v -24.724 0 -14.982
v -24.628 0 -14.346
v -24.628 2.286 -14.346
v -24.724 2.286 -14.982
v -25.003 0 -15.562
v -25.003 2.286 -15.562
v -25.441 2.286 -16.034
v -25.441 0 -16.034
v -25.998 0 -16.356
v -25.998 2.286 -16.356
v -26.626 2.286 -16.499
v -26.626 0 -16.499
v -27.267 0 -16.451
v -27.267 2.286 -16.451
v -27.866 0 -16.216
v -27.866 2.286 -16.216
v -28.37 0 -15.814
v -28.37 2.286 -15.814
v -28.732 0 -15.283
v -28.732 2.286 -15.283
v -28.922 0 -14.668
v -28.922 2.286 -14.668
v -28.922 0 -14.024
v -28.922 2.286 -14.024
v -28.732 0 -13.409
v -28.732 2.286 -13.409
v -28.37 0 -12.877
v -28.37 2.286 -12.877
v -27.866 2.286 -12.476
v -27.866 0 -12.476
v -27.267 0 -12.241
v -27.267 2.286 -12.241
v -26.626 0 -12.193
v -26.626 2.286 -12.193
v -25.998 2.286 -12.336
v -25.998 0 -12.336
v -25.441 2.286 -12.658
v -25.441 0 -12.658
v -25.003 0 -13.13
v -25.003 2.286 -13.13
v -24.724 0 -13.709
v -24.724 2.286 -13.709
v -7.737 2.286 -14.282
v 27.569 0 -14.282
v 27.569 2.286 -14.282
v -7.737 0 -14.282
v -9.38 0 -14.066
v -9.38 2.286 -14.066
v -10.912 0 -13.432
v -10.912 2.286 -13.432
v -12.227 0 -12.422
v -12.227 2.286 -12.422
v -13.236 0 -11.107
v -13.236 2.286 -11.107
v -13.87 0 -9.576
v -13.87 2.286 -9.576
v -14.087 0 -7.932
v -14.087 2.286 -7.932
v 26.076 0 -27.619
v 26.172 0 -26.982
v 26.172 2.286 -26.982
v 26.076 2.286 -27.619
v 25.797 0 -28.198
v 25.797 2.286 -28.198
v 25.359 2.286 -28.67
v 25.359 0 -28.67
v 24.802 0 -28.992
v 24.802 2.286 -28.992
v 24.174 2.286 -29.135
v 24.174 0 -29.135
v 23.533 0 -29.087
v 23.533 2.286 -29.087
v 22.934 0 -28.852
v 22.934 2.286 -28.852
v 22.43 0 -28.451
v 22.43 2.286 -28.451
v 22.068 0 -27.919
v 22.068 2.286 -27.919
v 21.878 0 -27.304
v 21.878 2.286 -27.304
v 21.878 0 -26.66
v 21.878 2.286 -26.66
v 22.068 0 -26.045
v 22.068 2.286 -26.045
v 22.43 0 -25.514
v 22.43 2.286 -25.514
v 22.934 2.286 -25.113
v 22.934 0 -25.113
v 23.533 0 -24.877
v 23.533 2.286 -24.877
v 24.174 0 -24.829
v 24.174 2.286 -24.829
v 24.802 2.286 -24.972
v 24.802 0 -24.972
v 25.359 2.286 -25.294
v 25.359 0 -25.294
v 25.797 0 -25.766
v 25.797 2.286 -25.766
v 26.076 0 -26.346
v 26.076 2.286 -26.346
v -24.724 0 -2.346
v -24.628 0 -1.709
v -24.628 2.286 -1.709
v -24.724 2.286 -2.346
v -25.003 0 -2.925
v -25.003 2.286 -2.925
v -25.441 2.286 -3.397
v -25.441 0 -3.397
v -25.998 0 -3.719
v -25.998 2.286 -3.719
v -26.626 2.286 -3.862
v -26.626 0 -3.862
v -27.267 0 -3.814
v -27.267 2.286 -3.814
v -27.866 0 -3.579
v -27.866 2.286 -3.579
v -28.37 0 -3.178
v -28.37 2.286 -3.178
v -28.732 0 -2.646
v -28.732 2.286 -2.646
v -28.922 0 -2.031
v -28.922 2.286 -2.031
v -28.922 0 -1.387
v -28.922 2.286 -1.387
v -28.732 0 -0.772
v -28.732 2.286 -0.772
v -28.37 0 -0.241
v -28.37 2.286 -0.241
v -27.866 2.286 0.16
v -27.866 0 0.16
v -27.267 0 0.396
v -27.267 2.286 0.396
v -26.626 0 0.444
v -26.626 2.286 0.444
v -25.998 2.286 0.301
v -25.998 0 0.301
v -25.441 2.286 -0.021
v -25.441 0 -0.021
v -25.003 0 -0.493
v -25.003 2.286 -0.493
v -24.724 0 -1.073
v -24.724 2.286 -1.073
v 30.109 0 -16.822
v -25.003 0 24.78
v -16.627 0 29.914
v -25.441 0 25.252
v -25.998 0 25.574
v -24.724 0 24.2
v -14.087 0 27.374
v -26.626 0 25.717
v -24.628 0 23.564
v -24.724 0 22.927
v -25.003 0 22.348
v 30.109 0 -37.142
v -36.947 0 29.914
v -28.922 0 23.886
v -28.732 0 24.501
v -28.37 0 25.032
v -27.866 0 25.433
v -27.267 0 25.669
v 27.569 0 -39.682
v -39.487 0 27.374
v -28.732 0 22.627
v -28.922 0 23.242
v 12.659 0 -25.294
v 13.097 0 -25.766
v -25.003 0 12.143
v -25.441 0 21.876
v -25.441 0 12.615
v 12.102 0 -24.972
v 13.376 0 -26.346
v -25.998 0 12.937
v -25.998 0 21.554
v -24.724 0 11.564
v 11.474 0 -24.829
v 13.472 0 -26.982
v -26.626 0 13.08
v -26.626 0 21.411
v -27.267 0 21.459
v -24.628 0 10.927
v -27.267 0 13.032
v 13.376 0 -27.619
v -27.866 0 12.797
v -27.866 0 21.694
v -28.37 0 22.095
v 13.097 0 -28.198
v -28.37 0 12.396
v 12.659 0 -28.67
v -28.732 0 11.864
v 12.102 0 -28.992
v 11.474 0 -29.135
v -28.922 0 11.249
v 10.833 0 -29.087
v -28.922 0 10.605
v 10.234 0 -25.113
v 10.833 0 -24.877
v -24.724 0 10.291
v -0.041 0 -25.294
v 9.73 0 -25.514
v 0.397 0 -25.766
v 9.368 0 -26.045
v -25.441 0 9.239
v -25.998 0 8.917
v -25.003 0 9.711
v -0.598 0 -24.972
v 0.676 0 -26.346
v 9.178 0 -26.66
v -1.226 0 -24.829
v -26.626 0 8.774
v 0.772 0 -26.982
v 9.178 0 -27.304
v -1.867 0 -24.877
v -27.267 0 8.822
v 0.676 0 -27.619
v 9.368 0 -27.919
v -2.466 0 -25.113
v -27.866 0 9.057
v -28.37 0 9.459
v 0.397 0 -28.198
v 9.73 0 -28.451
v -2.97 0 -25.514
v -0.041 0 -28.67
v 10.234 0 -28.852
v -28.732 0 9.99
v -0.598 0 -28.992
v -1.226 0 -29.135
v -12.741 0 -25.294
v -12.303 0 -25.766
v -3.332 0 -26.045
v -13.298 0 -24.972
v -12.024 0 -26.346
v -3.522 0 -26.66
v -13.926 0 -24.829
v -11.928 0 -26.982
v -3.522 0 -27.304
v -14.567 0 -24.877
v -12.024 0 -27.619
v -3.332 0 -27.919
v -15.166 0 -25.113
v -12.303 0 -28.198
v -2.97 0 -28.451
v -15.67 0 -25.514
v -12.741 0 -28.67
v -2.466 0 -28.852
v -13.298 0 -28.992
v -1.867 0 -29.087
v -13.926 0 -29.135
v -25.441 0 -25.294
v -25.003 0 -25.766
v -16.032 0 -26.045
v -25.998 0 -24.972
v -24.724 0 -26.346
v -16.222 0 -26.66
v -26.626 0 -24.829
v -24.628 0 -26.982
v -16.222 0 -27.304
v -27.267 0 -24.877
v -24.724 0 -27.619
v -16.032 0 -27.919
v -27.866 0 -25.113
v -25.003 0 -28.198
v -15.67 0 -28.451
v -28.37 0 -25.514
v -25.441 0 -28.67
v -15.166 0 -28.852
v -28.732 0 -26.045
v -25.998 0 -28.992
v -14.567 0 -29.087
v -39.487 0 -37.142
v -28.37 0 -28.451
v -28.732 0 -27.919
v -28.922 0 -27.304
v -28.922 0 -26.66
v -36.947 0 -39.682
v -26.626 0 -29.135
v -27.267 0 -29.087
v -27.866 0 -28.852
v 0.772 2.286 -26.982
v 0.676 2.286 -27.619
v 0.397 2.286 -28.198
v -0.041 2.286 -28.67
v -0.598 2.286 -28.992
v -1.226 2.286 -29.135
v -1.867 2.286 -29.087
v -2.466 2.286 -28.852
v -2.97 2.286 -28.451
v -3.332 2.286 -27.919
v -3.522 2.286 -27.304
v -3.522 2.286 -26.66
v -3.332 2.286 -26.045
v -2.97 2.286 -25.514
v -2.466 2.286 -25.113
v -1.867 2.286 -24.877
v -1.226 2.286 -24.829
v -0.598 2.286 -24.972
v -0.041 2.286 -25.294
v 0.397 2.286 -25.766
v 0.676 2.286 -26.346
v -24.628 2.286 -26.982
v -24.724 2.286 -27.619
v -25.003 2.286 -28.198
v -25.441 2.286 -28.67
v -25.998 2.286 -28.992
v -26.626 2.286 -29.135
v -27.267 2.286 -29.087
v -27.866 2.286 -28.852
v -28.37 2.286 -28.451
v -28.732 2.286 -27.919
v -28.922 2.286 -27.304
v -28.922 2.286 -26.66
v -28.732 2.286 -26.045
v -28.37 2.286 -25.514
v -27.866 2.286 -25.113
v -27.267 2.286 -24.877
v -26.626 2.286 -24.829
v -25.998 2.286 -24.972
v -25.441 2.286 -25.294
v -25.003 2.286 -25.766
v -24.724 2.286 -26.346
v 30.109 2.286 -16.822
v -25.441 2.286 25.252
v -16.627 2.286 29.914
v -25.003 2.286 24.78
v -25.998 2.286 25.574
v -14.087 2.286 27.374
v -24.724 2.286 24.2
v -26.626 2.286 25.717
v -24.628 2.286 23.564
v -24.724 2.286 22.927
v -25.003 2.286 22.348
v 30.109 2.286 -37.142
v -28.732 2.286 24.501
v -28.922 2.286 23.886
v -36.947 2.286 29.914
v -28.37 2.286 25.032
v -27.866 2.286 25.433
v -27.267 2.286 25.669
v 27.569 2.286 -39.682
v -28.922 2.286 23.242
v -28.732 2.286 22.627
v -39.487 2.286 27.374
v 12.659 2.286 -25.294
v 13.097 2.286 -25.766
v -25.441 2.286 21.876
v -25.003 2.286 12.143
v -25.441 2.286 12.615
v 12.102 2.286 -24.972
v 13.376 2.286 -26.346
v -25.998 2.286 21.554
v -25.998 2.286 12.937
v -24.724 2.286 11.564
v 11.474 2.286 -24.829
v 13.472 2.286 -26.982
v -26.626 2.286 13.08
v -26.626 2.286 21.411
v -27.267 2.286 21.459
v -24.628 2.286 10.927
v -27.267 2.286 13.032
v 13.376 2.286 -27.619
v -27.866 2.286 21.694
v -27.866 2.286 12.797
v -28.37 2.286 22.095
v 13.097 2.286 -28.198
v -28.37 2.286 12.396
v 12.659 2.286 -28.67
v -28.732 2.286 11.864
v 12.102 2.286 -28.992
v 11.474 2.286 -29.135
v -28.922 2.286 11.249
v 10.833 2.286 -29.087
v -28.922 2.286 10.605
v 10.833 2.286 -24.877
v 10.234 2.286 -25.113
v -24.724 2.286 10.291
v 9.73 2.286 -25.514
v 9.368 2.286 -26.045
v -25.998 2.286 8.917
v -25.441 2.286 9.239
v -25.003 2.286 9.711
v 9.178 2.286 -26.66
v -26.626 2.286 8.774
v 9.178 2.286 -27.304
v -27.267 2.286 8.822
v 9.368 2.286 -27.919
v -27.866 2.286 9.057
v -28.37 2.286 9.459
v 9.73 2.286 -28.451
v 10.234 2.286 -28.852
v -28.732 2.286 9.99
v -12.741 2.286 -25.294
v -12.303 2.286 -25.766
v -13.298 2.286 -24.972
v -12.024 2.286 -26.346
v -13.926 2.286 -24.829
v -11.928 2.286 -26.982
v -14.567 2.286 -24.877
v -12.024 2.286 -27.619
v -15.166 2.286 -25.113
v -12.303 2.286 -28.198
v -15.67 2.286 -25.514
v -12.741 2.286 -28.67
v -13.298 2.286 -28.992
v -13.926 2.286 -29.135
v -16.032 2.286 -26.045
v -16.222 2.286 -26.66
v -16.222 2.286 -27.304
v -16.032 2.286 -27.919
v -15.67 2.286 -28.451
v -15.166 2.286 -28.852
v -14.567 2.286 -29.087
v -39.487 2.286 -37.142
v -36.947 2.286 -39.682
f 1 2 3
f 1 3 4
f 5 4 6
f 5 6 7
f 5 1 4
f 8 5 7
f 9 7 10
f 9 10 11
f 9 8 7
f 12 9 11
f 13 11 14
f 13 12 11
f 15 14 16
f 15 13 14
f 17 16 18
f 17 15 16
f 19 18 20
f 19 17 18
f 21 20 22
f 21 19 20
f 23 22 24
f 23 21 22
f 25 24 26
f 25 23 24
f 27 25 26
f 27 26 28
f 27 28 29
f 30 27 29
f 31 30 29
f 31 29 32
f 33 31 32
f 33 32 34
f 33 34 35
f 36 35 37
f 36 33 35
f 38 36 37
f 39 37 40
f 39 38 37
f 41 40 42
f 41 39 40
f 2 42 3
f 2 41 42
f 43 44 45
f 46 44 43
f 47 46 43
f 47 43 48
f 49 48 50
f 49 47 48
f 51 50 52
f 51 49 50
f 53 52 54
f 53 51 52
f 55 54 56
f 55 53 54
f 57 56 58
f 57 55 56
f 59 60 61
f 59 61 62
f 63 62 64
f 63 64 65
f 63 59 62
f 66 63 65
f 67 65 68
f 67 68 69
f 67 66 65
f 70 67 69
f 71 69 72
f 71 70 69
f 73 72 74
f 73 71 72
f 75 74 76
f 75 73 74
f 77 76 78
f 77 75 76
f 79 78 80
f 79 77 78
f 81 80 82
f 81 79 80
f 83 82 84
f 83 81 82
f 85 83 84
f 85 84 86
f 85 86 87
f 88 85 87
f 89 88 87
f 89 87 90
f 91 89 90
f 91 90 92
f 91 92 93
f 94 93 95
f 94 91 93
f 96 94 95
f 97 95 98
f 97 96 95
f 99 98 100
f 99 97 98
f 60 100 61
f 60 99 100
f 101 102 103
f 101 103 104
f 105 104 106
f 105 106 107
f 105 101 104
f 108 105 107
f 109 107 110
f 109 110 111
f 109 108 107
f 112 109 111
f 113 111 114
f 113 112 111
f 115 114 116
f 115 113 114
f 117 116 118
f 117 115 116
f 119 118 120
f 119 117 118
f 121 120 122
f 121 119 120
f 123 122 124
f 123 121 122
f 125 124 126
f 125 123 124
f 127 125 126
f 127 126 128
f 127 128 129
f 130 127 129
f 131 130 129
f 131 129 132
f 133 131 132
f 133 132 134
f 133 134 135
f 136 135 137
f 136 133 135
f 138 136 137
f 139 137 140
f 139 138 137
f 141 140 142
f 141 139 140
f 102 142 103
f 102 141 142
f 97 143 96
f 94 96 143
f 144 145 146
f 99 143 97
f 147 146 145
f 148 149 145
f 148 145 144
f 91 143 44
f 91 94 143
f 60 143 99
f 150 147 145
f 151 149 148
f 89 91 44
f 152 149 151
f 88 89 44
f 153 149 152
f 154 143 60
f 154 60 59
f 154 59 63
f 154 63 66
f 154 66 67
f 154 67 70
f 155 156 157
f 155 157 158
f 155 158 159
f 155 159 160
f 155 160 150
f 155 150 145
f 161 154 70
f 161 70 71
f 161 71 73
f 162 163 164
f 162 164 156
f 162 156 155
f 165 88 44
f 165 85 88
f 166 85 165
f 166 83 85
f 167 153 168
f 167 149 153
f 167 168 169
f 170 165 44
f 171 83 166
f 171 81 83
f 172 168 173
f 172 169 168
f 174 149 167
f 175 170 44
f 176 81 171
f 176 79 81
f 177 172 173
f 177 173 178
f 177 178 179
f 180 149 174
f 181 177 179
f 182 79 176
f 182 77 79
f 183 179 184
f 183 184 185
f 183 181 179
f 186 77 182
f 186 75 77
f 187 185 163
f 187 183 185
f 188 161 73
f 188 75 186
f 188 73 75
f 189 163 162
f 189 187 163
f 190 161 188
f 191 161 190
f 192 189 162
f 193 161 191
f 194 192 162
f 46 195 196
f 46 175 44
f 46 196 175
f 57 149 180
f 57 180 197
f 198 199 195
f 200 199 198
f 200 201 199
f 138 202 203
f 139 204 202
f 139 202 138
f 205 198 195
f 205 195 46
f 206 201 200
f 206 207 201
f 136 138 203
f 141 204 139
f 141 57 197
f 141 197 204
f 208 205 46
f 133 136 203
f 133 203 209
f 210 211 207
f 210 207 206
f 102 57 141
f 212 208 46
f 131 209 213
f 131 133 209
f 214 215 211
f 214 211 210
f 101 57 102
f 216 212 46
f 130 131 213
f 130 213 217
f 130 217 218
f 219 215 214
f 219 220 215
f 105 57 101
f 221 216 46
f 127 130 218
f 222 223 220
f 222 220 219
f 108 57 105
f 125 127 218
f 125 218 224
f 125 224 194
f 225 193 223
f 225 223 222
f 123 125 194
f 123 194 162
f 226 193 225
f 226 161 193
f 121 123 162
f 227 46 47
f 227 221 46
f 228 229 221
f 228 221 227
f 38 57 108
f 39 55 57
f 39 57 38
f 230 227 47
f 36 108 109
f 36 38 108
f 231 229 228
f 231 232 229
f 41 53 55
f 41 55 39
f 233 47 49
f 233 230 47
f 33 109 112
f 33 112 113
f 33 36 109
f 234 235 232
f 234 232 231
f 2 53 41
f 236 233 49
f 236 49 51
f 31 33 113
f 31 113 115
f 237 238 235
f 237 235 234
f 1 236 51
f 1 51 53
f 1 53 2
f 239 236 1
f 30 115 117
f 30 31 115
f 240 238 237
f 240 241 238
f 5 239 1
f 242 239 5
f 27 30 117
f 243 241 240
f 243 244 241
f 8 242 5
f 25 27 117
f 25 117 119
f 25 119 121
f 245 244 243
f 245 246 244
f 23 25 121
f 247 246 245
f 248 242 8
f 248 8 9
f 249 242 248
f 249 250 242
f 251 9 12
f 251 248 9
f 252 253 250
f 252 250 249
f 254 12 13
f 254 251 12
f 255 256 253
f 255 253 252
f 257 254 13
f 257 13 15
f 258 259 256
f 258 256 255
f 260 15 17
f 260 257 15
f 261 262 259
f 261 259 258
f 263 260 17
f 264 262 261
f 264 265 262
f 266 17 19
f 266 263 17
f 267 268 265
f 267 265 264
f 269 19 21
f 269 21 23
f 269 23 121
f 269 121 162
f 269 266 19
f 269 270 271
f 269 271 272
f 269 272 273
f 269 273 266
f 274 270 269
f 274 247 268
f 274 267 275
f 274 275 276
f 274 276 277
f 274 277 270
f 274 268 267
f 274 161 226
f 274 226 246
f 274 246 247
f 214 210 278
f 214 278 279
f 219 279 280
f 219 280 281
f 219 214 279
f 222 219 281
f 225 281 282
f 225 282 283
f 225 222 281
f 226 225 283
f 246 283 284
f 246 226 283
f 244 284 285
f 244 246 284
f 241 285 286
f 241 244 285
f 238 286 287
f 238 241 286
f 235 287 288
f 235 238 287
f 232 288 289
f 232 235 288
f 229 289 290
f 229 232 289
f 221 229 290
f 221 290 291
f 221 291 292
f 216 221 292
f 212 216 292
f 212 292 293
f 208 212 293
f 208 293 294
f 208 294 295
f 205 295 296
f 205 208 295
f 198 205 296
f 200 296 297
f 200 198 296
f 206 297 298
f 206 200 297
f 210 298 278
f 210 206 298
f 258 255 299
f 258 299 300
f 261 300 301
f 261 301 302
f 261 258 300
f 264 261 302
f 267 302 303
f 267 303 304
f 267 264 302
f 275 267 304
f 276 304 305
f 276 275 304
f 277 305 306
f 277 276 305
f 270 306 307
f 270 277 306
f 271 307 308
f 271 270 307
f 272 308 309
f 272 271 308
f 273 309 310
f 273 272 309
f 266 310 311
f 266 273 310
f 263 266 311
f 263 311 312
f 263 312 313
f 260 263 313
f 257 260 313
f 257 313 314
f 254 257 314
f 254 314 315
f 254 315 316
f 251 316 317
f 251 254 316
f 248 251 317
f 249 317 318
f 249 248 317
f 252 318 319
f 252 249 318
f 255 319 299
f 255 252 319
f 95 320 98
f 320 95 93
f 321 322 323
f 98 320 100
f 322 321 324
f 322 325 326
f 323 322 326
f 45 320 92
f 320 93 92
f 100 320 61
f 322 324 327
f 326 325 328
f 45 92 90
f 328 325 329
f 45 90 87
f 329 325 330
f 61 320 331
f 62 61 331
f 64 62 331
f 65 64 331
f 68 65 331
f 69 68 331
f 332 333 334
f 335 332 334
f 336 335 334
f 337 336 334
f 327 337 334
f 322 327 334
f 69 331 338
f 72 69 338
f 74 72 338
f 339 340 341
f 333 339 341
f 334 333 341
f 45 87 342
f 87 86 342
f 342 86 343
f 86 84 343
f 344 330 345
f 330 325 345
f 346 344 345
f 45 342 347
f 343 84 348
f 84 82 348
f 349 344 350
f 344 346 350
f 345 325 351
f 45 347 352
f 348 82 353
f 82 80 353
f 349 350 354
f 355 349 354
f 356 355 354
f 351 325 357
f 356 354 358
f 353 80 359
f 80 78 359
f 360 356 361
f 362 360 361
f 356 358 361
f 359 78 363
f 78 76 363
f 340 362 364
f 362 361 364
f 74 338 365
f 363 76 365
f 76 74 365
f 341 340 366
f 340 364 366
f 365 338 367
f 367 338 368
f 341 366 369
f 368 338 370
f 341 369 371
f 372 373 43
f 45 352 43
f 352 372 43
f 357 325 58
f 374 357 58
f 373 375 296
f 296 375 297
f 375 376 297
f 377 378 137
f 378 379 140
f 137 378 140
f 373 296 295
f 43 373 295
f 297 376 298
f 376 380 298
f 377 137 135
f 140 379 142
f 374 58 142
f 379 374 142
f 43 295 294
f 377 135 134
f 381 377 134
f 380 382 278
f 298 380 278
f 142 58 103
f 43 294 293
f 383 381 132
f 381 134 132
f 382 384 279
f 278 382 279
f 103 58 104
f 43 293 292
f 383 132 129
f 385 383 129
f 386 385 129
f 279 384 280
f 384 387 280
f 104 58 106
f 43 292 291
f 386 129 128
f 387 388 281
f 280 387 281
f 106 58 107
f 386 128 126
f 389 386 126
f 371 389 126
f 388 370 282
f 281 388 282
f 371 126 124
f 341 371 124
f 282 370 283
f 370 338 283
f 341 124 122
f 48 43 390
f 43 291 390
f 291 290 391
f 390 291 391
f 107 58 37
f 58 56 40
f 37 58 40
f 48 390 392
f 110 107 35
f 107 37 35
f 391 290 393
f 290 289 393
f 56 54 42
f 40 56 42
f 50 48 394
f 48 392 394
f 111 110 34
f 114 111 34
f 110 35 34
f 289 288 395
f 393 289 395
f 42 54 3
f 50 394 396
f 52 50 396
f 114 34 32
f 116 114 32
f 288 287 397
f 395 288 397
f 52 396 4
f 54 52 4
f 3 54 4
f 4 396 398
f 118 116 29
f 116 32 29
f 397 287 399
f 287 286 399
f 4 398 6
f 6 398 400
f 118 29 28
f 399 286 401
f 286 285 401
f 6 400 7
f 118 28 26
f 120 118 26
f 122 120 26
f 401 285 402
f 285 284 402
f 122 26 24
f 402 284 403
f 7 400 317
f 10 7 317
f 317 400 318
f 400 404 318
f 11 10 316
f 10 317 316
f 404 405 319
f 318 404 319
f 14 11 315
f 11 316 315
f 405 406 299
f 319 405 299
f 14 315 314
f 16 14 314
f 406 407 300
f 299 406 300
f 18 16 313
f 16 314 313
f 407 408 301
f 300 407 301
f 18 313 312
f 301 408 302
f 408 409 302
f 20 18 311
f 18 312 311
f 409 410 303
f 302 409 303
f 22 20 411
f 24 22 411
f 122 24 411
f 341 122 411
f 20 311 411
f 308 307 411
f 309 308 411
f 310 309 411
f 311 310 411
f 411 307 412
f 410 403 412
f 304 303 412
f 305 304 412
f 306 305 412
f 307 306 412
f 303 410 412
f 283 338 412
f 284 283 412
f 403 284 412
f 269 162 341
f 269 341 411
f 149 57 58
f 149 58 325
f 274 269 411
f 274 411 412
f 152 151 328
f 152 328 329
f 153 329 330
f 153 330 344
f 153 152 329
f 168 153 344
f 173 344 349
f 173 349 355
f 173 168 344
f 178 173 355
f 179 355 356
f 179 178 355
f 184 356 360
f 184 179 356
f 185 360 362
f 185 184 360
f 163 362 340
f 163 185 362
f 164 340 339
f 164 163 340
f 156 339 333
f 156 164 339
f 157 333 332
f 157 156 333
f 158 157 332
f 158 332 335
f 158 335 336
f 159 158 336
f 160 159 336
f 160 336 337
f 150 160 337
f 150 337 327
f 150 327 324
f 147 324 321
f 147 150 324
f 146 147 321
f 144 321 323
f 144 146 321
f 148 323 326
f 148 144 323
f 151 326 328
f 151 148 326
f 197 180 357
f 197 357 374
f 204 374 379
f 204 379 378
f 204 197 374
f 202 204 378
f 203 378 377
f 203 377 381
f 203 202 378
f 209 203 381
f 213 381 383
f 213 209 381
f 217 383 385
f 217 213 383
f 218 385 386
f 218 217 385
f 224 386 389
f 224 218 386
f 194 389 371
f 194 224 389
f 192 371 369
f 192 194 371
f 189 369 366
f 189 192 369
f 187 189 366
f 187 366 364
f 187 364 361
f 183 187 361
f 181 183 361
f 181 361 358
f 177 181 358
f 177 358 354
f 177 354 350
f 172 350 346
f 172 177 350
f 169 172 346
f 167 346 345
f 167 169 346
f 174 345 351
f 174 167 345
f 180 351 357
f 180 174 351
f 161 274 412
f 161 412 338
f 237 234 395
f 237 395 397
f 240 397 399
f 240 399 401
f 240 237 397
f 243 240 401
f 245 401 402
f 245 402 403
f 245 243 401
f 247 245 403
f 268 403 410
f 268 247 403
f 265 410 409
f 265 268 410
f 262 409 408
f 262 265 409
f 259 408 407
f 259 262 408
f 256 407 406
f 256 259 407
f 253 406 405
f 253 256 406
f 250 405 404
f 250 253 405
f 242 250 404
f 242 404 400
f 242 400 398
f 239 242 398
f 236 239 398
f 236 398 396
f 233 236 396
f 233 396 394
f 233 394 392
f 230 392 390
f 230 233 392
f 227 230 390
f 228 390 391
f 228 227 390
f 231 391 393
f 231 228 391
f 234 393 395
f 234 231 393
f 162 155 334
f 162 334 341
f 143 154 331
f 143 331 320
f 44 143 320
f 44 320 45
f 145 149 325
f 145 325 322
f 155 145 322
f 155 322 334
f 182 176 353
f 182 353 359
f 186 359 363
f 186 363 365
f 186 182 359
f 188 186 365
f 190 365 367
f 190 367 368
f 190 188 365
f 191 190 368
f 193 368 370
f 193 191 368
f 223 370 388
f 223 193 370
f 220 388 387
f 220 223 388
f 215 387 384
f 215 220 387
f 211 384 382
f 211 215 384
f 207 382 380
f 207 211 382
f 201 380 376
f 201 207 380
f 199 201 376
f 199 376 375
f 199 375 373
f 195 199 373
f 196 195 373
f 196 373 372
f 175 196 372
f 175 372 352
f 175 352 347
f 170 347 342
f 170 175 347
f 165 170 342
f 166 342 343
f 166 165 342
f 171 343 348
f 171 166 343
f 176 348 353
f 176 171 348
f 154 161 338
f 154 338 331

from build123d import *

# Parameters (mm, degrees)
SKETCH2_R           = 2.159
BOSS_EXTRUDE2_DEPTH = 2.286


with BuildPart() as part:
    # Sketch2 → Boss-Extrude2 (new body)
    with BuildSketch(Plane(origin=(0, 0, 0), x_dir=(1, 0, 0), z_dir=(0, 1, 0))):
        with BuildLine():
            Line((-39.486864346, -27.37374707), (-39.486864346, 37.14225293))
            Line((-39.486864346, 37.14225293), (-36.946864346, 39.68225293))
            Line((-36.946864346, 39.68225293), (27.569135654, 39.68225293))
            Line((27.569135654, 39.68225293), (30.109135654, 37.14225293))
            Line((30.109135654, 37.14225293), (30.109135654, 16.82225293))
            Line((30.109135654, 16.82225293), (27.569135654, 14.28225293))
            Line((27.569135654, 14.28225293), (-7.736864346, 14.28225293))
            ThreePointArc((-7.736864346, 14.28225293), (-12.226992406, 12.422380991), (-14.086864346, 7.93225293))
            Line((-14.086864346, 7.93225293), (-14.086864346, -27.37374707))
            Line((-14.086864346, -27.37374707), (-16.626864346, -29.91374707))
            Line((-16.626864346, -29.91374707), (-36.946864346, -29.91374707))
            Line((-36.946864346, -29.91374707), (-39.486864346, -27.37374707))
        make_face()
        with Locations((-26.786864346, 26.98225293)):
            Circle(SKETCH2_R, mode=Mode.SUBTRACT)
        with Locations((-14.086864346, 26.98225293)):
            Circle(SKETCH2_R, mode=Mode.SUBTRACT)
        with Locations((-1.386864346, 26.98225293)):
            Circle(SKETCH2_R, mode=Mode.SUBTRACT)
        with Locations((11.313135654, 26.98225293)):
            Circle(SKETCH2_R, mode=Mode.SUBTRACT)
        with Locations((24.013135654, 26.98225293)):
            Circle(SKETCH2_R, mode=Mode.SUBTRACT)
        with Locations((-26.786864346, 14.34575293)):
            Circle(SKETCH2_R, mode=Mode.SUBTRACT)
        with Locations((-26.786864346, 1.70925293)):
            Circle(SKETCH2_R, mode=Mode.SUBTRACT)
        with Locations((-26.786864346, -10.92724707)):
            Circle(SKETCH2_R, mode=Mode.SUBTRACT)
        with Locations((-26.786864346, -23.56374707)):
            Circle(SKETCH2_R, mode=Mode.SUBTRACT)
    extrude(amount=BOSS_EXTRUDE2_DEPTH)


solid = part.part
